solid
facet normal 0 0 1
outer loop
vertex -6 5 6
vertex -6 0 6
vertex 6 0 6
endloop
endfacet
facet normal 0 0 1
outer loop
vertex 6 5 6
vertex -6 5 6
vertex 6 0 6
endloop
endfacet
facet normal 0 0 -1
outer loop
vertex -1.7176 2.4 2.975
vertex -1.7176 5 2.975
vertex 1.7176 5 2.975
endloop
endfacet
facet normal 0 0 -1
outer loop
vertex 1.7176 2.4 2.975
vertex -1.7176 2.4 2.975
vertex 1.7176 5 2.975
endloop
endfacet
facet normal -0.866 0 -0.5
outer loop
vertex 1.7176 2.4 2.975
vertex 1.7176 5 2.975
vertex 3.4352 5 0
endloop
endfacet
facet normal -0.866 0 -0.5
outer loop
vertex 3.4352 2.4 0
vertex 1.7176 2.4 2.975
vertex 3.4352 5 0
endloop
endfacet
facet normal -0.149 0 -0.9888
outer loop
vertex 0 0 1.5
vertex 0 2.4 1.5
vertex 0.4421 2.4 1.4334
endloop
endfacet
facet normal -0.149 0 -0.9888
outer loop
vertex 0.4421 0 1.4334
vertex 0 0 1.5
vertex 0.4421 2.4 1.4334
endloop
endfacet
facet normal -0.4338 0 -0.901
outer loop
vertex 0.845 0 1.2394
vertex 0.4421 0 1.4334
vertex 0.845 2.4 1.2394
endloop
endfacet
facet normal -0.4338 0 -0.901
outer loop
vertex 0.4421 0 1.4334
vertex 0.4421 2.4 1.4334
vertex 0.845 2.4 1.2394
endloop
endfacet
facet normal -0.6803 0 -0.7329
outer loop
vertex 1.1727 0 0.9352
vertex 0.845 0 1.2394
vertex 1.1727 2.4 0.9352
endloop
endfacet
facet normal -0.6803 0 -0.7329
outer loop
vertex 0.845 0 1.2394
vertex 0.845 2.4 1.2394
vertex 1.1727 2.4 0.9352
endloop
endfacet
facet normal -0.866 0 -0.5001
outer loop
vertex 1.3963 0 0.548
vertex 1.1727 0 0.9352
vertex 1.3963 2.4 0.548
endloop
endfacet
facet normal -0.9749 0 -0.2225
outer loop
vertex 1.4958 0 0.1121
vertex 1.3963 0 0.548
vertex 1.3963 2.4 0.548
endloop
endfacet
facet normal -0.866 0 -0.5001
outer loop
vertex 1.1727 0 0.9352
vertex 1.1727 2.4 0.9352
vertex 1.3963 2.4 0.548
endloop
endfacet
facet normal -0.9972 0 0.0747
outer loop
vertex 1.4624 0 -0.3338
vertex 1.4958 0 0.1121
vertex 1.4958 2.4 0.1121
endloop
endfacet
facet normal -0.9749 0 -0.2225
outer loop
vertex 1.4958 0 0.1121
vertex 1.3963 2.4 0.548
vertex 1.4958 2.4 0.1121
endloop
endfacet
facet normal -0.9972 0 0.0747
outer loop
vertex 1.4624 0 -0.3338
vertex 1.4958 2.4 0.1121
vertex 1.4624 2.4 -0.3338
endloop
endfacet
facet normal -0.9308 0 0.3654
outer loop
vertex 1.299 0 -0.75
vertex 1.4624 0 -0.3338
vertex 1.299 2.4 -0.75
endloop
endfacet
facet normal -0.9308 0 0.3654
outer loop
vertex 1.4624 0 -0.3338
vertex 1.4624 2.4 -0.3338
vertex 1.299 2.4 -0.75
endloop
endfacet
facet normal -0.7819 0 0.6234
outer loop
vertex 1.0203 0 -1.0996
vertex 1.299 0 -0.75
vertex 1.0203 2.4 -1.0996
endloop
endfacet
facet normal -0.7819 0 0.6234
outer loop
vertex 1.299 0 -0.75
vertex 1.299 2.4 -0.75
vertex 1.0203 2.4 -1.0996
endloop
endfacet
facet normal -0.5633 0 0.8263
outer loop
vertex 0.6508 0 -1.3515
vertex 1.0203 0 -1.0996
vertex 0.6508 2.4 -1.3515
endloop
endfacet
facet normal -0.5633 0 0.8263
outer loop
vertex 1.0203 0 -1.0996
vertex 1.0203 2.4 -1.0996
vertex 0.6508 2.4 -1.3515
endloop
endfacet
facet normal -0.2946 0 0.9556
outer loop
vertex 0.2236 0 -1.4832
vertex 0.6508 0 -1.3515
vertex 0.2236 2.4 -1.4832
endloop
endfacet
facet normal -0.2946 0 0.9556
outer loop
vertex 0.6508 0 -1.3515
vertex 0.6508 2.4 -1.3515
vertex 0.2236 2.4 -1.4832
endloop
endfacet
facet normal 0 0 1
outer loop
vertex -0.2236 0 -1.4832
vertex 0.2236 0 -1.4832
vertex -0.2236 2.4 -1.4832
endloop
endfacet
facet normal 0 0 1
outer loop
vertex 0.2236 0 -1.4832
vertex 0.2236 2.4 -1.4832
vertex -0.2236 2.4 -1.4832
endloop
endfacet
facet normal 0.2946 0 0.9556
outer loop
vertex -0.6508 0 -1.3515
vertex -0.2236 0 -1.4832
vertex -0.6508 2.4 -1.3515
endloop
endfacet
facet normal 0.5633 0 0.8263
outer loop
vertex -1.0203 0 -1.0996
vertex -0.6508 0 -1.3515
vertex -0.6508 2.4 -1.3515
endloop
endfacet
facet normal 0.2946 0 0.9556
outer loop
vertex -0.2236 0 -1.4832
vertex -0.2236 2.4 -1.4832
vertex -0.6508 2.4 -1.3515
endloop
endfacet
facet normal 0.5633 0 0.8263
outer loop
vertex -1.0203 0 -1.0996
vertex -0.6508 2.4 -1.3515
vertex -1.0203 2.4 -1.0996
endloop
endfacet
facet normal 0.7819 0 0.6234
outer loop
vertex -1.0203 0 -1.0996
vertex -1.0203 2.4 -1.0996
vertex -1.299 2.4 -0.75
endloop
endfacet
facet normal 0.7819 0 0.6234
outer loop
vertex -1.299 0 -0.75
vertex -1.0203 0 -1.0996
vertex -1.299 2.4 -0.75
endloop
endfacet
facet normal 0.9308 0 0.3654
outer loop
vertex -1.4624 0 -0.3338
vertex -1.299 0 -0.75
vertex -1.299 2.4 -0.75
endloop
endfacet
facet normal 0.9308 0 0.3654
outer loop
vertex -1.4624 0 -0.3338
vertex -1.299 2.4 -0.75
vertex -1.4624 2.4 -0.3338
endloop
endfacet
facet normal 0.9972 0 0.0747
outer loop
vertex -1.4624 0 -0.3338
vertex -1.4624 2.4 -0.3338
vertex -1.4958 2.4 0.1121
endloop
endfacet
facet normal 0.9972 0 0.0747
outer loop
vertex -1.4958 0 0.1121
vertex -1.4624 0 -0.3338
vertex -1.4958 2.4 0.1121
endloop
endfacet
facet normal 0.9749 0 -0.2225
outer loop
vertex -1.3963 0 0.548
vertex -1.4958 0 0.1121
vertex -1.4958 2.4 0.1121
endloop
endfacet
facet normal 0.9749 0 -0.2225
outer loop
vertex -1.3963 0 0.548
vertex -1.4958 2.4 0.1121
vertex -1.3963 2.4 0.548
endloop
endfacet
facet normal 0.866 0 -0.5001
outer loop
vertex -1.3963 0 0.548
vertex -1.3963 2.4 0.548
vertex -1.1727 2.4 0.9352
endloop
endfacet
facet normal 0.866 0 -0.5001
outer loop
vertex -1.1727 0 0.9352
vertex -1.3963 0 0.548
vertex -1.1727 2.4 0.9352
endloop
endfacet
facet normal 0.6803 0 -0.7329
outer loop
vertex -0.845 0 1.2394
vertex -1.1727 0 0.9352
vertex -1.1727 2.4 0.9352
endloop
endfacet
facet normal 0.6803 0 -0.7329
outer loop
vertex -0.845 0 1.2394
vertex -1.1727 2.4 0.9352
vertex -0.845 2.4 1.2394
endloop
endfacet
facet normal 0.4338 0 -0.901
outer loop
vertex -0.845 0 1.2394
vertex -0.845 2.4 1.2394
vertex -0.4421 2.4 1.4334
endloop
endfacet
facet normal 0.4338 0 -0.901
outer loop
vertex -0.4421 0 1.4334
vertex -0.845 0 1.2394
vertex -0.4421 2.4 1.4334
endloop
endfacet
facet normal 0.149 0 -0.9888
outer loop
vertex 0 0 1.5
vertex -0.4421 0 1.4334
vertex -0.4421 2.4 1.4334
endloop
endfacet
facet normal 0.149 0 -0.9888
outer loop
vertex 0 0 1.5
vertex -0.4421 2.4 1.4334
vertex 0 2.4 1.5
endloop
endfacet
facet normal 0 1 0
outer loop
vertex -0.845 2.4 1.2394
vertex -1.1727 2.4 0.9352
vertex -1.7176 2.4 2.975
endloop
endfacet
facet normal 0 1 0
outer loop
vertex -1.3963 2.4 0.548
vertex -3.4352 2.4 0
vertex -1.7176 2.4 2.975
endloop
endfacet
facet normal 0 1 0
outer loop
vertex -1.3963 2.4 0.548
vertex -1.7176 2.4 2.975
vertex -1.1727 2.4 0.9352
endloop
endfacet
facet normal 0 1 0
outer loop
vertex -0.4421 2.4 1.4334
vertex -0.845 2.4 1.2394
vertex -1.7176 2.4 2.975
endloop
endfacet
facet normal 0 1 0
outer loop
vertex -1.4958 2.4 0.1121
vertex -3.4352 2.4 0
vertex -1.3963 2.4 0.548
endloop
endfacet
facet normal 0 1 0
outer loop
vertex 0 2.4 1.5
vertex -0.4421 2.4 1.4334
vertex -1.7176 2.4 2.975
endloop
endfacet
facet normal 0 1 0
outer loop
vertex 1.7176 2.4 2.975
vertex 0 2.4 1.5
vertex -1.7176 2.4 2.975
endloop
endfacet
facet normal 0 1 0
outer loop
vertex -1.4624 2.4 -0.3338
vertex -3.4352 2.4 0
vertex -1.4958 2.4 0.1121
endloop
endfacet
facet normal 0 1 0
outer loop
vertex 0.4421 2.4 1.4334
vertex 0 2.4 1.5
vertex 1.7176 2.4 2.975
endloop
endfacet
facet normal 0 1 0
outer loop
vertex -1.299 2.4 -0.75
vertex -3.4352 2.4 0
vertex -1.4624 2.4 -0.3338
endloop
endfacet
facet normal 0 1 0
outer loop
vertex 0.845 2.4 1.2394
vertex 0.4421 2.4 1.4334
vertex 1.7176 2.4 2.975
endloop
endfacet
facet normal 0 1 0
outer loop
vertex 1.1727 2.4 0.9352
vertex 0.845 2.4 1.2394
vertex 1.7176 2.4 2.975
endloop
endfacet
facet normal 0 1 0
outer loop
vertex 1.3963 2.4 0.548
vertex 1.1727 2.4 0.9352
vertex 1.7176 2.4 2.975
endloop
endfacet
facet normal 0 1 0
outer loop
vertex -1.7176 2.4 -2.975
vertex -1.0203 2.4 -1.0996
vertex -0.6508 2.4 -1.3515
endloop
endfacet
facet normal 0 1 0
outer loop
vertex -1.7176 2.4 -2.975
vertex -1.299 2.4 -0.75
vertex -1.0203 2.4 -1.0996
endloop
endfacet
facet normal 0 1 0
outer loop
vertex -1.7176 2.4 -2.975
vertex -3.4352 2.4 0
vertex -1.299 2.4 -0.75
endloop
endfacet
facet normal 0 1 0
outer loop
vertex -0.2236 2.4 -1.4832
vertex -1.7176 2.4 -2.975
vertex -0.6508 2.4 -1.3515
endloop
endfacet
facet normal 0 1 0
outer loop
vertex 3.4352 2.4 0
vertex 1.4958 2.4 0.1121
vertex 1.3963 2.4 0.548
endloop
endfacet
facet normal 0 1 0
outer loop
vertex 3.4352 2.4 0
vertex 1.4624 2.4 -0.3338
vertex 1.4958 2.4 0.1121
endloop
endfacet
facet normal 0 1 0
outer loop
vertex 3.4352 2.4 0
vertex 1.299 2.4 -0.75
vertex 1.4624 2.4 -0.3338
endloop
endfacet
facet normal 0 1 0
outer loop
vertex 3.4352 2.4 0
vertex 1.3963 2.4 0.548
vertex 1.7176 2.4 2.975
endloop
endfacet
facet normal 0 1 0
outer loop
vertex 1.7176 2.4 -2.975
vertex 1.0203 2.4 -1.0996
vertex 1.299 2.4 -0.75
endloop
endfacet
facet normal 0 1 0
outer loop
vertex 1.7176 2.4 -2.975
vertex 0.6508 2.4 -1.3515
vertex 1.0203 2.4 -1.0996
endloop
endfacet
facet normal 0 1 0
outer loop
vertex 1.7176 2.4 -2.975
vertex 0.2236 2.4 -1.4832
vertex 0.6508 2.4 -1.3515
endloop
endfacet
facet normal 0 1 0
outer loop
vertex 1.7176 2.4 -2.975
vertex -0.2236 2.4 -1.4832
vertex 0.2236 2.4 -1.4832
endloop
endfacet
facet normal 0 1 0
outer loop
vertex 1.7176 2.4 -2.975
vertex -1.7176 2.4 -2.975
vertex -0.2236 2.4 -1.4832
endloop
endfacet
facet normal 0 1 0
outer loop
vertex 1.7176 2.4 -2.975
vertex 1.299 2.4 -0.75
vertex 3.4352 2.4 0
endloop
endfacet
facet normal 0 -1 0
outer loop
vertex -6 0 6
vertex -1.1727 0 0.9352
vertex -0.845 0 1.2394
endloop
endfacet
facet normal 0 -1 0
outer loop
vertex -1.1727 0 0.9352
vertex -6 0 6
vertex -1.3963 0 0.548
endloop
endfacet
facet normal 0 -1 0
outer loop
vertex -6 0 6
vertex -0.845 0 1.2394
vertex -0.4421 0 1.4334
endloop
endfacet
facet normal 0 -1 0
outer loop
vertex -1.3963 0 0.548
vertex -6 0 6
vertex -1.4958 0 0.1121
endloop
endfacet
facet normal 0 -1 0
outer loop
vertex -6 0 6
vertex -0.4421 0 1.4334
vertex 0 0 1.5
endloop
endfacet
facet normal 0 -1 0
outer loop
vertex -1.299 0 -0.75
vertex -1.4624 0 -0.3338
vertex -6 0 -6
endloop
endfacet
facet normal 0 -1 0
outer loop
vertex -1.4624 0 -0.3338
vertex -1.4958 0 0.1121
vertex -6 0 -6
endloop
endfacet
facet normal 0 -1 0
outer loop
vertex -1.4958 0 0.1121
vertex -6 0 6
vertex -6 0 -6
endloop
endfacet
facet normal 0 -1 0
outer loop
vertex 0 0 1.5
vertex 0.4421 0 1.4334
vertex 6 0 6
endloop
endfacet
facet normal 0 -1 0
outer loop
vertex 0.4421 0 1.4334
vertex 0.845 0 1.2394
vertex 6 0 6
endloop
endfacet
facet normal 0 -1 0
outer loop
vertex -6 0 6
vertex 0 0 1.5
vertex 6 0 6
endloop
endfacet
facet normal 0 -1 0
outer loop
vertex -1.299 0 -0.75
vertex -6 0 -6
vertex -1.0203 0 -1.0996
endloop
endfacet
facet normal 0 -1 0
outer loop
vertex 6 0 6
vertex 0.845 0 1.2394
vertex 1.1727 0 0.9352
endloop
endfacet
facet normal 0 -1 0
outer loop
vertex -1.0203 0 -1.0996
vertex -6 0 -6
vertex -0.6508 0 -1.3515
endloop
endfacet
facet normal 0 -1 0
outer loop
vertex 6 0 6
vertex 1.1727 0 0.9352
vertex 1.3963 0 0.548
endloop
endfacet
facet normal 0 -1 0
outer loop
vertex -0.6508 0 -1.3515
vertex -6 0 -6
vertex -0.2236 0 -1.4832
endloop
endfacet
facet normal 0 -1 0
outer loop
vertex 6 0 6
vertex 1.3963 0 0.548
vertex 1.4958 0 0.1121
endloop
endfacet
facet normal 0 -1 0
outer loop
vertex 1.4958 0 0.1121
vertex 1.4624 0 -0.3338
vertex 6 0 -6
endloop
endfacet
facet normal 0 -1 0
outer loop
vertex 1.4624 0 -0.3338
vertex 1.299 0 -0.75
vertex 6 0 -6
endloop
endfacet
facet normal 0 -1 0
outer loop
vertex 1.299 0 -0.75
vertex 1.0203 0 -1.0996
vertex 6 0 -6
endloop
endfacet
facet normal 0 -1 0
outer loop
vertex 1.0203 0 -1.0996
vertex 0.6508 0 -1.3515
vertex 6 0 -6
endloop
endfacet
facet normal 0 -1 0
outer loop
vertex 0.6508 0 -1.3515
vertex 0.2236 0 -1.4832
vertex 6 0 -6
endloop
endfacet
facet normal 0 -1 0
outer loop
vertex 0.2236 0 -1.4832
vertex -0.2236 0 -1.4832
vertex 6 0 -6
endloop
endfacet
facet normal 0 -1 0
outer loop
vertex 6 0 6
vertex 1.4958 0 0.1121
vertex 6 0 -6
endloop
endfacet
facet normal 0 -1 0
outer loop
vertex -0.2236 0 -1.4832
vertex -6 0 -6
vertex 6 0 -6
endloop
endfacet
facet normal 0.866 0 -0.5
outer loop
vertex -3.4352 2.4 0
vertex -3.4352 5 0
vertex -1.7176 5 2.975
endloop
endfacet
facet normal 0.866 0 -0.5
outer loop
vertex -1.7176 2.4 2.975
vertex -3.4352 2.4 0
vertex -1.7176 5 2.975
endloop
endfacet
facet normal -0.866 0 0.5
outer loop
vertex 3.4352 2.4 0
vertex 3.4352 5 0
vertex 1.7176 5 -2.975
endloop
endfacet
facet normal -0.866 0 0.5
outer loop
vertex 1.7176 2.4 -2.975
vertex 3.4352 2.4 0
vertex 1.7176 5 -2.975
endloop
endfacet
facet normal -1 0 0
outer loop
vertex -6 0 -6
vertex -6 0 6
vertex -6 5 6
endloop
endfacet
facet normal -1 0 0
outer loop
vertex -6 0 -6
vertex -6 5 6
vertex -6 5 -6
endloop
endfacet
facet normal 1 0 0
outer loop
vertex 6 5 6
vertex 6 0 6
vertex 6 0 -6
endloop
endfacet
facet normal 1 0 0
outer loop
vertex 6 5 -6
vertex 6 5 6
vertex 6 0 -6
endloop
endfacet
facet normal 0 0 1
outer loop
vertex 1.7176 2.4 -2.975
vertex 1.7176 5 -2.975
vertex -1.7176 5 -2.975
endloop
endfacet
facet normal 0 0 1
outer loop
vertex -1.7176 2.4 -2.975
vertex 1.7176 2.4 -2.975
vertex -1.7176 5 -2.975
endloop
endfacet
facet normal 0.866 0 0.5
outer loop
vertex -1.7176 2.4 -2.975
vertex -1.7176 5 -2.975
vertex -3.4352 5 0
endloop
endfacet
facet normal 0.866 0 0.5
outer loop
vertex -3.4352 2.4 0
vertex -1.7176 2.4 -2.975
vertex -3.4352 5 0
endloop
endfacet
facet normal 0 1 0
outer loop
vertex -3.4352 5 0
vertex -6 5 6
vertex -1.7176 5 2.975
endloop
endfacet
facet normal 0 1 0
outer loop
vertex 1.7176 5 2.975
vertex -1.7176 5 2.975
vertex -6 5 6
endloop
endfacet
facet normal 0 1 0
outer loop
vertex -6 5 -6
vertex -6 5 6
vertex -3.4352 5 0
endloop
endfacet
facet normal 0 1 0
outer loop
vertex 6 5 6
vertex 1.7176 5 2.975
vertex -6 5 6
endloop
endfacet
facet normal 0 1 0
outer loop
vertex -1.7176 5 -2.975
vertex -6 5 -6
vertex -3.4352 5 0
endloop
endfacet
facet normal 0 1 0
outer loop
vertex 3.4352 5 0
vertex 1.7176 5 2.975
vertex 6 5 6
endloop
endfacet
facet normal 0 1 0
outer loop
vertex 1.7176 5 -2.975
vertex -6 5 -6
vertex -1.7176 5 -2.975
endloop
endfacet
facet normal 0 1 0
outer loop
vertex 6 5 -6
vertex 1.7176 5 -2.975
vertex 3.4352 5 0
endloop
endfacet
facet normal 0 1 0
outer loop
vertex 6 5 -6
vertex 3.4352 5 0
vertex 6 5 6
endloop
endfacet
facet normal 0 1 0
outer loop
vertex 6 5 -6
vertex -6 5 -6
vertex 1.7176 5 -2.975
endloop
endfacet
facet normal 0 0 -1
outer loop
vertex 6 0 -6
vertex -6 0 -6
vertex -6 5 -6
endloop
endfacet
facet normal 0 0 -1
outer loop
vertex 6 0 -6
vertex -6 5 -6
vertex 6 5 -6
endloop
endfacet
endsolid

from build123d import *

# Parameters (mm, degrees)
SKETCH1_W           = 12
SKETCH1_H           = 12
BOSS_EXTRUDE1_DEPTH = 5
SKETCH2_R           = 1.5
CUT_EXTRUDE1_DEPTH  = 5
CUT_EXTRUDE2_DEPTH  = 2.6


with BuildPart() as part:
    # Sketch1 → Boss-Extrude1 (new body)
    with BuildSketch(Plane(origin=(0, 0, 0), x_dir=(1, 0, 0), z_dir=(0, 1, 0))):
        Rectangle(SKETCH1_W, SKETCH1_H)
    extrude(amount=BOSS_EXTRUDE1_DEPTH)

    # Sketch2 → Cut-Extrude1 (cut)
    with BuildSketch(Plane(origin=(0, 5, 0), x_dir=(1, 0, 0), z_dir=(0, 1, 0))):
        with Locations(Location((0, 0, 0), (0, 0, 270))):
            Circle(SKETCH2_R)
    extrude(amount=-CUT_EXTRUDE1_DEPTH, mode=Mode.SUBTRACT)

    # Sketch3 → Cut-Extrude2 (cut)
    with BuildSketch(Plane(origin=(0, 5, 0), x_dir=(1, 0, 0), z_dir=(0, 1, 0))):
        Polygon((3.435234102, 0), (1.717617051, 2.975), (-1.717617051, 2.975), (-3.435234102, 0), (-1.717617051, -2.975), (1.717617051, -2.975), align=None)
    extrude(amount=-CUT_EXTRUDE2_DEPTH, mode=Mode.SUBTRACT)


solid = part.part
